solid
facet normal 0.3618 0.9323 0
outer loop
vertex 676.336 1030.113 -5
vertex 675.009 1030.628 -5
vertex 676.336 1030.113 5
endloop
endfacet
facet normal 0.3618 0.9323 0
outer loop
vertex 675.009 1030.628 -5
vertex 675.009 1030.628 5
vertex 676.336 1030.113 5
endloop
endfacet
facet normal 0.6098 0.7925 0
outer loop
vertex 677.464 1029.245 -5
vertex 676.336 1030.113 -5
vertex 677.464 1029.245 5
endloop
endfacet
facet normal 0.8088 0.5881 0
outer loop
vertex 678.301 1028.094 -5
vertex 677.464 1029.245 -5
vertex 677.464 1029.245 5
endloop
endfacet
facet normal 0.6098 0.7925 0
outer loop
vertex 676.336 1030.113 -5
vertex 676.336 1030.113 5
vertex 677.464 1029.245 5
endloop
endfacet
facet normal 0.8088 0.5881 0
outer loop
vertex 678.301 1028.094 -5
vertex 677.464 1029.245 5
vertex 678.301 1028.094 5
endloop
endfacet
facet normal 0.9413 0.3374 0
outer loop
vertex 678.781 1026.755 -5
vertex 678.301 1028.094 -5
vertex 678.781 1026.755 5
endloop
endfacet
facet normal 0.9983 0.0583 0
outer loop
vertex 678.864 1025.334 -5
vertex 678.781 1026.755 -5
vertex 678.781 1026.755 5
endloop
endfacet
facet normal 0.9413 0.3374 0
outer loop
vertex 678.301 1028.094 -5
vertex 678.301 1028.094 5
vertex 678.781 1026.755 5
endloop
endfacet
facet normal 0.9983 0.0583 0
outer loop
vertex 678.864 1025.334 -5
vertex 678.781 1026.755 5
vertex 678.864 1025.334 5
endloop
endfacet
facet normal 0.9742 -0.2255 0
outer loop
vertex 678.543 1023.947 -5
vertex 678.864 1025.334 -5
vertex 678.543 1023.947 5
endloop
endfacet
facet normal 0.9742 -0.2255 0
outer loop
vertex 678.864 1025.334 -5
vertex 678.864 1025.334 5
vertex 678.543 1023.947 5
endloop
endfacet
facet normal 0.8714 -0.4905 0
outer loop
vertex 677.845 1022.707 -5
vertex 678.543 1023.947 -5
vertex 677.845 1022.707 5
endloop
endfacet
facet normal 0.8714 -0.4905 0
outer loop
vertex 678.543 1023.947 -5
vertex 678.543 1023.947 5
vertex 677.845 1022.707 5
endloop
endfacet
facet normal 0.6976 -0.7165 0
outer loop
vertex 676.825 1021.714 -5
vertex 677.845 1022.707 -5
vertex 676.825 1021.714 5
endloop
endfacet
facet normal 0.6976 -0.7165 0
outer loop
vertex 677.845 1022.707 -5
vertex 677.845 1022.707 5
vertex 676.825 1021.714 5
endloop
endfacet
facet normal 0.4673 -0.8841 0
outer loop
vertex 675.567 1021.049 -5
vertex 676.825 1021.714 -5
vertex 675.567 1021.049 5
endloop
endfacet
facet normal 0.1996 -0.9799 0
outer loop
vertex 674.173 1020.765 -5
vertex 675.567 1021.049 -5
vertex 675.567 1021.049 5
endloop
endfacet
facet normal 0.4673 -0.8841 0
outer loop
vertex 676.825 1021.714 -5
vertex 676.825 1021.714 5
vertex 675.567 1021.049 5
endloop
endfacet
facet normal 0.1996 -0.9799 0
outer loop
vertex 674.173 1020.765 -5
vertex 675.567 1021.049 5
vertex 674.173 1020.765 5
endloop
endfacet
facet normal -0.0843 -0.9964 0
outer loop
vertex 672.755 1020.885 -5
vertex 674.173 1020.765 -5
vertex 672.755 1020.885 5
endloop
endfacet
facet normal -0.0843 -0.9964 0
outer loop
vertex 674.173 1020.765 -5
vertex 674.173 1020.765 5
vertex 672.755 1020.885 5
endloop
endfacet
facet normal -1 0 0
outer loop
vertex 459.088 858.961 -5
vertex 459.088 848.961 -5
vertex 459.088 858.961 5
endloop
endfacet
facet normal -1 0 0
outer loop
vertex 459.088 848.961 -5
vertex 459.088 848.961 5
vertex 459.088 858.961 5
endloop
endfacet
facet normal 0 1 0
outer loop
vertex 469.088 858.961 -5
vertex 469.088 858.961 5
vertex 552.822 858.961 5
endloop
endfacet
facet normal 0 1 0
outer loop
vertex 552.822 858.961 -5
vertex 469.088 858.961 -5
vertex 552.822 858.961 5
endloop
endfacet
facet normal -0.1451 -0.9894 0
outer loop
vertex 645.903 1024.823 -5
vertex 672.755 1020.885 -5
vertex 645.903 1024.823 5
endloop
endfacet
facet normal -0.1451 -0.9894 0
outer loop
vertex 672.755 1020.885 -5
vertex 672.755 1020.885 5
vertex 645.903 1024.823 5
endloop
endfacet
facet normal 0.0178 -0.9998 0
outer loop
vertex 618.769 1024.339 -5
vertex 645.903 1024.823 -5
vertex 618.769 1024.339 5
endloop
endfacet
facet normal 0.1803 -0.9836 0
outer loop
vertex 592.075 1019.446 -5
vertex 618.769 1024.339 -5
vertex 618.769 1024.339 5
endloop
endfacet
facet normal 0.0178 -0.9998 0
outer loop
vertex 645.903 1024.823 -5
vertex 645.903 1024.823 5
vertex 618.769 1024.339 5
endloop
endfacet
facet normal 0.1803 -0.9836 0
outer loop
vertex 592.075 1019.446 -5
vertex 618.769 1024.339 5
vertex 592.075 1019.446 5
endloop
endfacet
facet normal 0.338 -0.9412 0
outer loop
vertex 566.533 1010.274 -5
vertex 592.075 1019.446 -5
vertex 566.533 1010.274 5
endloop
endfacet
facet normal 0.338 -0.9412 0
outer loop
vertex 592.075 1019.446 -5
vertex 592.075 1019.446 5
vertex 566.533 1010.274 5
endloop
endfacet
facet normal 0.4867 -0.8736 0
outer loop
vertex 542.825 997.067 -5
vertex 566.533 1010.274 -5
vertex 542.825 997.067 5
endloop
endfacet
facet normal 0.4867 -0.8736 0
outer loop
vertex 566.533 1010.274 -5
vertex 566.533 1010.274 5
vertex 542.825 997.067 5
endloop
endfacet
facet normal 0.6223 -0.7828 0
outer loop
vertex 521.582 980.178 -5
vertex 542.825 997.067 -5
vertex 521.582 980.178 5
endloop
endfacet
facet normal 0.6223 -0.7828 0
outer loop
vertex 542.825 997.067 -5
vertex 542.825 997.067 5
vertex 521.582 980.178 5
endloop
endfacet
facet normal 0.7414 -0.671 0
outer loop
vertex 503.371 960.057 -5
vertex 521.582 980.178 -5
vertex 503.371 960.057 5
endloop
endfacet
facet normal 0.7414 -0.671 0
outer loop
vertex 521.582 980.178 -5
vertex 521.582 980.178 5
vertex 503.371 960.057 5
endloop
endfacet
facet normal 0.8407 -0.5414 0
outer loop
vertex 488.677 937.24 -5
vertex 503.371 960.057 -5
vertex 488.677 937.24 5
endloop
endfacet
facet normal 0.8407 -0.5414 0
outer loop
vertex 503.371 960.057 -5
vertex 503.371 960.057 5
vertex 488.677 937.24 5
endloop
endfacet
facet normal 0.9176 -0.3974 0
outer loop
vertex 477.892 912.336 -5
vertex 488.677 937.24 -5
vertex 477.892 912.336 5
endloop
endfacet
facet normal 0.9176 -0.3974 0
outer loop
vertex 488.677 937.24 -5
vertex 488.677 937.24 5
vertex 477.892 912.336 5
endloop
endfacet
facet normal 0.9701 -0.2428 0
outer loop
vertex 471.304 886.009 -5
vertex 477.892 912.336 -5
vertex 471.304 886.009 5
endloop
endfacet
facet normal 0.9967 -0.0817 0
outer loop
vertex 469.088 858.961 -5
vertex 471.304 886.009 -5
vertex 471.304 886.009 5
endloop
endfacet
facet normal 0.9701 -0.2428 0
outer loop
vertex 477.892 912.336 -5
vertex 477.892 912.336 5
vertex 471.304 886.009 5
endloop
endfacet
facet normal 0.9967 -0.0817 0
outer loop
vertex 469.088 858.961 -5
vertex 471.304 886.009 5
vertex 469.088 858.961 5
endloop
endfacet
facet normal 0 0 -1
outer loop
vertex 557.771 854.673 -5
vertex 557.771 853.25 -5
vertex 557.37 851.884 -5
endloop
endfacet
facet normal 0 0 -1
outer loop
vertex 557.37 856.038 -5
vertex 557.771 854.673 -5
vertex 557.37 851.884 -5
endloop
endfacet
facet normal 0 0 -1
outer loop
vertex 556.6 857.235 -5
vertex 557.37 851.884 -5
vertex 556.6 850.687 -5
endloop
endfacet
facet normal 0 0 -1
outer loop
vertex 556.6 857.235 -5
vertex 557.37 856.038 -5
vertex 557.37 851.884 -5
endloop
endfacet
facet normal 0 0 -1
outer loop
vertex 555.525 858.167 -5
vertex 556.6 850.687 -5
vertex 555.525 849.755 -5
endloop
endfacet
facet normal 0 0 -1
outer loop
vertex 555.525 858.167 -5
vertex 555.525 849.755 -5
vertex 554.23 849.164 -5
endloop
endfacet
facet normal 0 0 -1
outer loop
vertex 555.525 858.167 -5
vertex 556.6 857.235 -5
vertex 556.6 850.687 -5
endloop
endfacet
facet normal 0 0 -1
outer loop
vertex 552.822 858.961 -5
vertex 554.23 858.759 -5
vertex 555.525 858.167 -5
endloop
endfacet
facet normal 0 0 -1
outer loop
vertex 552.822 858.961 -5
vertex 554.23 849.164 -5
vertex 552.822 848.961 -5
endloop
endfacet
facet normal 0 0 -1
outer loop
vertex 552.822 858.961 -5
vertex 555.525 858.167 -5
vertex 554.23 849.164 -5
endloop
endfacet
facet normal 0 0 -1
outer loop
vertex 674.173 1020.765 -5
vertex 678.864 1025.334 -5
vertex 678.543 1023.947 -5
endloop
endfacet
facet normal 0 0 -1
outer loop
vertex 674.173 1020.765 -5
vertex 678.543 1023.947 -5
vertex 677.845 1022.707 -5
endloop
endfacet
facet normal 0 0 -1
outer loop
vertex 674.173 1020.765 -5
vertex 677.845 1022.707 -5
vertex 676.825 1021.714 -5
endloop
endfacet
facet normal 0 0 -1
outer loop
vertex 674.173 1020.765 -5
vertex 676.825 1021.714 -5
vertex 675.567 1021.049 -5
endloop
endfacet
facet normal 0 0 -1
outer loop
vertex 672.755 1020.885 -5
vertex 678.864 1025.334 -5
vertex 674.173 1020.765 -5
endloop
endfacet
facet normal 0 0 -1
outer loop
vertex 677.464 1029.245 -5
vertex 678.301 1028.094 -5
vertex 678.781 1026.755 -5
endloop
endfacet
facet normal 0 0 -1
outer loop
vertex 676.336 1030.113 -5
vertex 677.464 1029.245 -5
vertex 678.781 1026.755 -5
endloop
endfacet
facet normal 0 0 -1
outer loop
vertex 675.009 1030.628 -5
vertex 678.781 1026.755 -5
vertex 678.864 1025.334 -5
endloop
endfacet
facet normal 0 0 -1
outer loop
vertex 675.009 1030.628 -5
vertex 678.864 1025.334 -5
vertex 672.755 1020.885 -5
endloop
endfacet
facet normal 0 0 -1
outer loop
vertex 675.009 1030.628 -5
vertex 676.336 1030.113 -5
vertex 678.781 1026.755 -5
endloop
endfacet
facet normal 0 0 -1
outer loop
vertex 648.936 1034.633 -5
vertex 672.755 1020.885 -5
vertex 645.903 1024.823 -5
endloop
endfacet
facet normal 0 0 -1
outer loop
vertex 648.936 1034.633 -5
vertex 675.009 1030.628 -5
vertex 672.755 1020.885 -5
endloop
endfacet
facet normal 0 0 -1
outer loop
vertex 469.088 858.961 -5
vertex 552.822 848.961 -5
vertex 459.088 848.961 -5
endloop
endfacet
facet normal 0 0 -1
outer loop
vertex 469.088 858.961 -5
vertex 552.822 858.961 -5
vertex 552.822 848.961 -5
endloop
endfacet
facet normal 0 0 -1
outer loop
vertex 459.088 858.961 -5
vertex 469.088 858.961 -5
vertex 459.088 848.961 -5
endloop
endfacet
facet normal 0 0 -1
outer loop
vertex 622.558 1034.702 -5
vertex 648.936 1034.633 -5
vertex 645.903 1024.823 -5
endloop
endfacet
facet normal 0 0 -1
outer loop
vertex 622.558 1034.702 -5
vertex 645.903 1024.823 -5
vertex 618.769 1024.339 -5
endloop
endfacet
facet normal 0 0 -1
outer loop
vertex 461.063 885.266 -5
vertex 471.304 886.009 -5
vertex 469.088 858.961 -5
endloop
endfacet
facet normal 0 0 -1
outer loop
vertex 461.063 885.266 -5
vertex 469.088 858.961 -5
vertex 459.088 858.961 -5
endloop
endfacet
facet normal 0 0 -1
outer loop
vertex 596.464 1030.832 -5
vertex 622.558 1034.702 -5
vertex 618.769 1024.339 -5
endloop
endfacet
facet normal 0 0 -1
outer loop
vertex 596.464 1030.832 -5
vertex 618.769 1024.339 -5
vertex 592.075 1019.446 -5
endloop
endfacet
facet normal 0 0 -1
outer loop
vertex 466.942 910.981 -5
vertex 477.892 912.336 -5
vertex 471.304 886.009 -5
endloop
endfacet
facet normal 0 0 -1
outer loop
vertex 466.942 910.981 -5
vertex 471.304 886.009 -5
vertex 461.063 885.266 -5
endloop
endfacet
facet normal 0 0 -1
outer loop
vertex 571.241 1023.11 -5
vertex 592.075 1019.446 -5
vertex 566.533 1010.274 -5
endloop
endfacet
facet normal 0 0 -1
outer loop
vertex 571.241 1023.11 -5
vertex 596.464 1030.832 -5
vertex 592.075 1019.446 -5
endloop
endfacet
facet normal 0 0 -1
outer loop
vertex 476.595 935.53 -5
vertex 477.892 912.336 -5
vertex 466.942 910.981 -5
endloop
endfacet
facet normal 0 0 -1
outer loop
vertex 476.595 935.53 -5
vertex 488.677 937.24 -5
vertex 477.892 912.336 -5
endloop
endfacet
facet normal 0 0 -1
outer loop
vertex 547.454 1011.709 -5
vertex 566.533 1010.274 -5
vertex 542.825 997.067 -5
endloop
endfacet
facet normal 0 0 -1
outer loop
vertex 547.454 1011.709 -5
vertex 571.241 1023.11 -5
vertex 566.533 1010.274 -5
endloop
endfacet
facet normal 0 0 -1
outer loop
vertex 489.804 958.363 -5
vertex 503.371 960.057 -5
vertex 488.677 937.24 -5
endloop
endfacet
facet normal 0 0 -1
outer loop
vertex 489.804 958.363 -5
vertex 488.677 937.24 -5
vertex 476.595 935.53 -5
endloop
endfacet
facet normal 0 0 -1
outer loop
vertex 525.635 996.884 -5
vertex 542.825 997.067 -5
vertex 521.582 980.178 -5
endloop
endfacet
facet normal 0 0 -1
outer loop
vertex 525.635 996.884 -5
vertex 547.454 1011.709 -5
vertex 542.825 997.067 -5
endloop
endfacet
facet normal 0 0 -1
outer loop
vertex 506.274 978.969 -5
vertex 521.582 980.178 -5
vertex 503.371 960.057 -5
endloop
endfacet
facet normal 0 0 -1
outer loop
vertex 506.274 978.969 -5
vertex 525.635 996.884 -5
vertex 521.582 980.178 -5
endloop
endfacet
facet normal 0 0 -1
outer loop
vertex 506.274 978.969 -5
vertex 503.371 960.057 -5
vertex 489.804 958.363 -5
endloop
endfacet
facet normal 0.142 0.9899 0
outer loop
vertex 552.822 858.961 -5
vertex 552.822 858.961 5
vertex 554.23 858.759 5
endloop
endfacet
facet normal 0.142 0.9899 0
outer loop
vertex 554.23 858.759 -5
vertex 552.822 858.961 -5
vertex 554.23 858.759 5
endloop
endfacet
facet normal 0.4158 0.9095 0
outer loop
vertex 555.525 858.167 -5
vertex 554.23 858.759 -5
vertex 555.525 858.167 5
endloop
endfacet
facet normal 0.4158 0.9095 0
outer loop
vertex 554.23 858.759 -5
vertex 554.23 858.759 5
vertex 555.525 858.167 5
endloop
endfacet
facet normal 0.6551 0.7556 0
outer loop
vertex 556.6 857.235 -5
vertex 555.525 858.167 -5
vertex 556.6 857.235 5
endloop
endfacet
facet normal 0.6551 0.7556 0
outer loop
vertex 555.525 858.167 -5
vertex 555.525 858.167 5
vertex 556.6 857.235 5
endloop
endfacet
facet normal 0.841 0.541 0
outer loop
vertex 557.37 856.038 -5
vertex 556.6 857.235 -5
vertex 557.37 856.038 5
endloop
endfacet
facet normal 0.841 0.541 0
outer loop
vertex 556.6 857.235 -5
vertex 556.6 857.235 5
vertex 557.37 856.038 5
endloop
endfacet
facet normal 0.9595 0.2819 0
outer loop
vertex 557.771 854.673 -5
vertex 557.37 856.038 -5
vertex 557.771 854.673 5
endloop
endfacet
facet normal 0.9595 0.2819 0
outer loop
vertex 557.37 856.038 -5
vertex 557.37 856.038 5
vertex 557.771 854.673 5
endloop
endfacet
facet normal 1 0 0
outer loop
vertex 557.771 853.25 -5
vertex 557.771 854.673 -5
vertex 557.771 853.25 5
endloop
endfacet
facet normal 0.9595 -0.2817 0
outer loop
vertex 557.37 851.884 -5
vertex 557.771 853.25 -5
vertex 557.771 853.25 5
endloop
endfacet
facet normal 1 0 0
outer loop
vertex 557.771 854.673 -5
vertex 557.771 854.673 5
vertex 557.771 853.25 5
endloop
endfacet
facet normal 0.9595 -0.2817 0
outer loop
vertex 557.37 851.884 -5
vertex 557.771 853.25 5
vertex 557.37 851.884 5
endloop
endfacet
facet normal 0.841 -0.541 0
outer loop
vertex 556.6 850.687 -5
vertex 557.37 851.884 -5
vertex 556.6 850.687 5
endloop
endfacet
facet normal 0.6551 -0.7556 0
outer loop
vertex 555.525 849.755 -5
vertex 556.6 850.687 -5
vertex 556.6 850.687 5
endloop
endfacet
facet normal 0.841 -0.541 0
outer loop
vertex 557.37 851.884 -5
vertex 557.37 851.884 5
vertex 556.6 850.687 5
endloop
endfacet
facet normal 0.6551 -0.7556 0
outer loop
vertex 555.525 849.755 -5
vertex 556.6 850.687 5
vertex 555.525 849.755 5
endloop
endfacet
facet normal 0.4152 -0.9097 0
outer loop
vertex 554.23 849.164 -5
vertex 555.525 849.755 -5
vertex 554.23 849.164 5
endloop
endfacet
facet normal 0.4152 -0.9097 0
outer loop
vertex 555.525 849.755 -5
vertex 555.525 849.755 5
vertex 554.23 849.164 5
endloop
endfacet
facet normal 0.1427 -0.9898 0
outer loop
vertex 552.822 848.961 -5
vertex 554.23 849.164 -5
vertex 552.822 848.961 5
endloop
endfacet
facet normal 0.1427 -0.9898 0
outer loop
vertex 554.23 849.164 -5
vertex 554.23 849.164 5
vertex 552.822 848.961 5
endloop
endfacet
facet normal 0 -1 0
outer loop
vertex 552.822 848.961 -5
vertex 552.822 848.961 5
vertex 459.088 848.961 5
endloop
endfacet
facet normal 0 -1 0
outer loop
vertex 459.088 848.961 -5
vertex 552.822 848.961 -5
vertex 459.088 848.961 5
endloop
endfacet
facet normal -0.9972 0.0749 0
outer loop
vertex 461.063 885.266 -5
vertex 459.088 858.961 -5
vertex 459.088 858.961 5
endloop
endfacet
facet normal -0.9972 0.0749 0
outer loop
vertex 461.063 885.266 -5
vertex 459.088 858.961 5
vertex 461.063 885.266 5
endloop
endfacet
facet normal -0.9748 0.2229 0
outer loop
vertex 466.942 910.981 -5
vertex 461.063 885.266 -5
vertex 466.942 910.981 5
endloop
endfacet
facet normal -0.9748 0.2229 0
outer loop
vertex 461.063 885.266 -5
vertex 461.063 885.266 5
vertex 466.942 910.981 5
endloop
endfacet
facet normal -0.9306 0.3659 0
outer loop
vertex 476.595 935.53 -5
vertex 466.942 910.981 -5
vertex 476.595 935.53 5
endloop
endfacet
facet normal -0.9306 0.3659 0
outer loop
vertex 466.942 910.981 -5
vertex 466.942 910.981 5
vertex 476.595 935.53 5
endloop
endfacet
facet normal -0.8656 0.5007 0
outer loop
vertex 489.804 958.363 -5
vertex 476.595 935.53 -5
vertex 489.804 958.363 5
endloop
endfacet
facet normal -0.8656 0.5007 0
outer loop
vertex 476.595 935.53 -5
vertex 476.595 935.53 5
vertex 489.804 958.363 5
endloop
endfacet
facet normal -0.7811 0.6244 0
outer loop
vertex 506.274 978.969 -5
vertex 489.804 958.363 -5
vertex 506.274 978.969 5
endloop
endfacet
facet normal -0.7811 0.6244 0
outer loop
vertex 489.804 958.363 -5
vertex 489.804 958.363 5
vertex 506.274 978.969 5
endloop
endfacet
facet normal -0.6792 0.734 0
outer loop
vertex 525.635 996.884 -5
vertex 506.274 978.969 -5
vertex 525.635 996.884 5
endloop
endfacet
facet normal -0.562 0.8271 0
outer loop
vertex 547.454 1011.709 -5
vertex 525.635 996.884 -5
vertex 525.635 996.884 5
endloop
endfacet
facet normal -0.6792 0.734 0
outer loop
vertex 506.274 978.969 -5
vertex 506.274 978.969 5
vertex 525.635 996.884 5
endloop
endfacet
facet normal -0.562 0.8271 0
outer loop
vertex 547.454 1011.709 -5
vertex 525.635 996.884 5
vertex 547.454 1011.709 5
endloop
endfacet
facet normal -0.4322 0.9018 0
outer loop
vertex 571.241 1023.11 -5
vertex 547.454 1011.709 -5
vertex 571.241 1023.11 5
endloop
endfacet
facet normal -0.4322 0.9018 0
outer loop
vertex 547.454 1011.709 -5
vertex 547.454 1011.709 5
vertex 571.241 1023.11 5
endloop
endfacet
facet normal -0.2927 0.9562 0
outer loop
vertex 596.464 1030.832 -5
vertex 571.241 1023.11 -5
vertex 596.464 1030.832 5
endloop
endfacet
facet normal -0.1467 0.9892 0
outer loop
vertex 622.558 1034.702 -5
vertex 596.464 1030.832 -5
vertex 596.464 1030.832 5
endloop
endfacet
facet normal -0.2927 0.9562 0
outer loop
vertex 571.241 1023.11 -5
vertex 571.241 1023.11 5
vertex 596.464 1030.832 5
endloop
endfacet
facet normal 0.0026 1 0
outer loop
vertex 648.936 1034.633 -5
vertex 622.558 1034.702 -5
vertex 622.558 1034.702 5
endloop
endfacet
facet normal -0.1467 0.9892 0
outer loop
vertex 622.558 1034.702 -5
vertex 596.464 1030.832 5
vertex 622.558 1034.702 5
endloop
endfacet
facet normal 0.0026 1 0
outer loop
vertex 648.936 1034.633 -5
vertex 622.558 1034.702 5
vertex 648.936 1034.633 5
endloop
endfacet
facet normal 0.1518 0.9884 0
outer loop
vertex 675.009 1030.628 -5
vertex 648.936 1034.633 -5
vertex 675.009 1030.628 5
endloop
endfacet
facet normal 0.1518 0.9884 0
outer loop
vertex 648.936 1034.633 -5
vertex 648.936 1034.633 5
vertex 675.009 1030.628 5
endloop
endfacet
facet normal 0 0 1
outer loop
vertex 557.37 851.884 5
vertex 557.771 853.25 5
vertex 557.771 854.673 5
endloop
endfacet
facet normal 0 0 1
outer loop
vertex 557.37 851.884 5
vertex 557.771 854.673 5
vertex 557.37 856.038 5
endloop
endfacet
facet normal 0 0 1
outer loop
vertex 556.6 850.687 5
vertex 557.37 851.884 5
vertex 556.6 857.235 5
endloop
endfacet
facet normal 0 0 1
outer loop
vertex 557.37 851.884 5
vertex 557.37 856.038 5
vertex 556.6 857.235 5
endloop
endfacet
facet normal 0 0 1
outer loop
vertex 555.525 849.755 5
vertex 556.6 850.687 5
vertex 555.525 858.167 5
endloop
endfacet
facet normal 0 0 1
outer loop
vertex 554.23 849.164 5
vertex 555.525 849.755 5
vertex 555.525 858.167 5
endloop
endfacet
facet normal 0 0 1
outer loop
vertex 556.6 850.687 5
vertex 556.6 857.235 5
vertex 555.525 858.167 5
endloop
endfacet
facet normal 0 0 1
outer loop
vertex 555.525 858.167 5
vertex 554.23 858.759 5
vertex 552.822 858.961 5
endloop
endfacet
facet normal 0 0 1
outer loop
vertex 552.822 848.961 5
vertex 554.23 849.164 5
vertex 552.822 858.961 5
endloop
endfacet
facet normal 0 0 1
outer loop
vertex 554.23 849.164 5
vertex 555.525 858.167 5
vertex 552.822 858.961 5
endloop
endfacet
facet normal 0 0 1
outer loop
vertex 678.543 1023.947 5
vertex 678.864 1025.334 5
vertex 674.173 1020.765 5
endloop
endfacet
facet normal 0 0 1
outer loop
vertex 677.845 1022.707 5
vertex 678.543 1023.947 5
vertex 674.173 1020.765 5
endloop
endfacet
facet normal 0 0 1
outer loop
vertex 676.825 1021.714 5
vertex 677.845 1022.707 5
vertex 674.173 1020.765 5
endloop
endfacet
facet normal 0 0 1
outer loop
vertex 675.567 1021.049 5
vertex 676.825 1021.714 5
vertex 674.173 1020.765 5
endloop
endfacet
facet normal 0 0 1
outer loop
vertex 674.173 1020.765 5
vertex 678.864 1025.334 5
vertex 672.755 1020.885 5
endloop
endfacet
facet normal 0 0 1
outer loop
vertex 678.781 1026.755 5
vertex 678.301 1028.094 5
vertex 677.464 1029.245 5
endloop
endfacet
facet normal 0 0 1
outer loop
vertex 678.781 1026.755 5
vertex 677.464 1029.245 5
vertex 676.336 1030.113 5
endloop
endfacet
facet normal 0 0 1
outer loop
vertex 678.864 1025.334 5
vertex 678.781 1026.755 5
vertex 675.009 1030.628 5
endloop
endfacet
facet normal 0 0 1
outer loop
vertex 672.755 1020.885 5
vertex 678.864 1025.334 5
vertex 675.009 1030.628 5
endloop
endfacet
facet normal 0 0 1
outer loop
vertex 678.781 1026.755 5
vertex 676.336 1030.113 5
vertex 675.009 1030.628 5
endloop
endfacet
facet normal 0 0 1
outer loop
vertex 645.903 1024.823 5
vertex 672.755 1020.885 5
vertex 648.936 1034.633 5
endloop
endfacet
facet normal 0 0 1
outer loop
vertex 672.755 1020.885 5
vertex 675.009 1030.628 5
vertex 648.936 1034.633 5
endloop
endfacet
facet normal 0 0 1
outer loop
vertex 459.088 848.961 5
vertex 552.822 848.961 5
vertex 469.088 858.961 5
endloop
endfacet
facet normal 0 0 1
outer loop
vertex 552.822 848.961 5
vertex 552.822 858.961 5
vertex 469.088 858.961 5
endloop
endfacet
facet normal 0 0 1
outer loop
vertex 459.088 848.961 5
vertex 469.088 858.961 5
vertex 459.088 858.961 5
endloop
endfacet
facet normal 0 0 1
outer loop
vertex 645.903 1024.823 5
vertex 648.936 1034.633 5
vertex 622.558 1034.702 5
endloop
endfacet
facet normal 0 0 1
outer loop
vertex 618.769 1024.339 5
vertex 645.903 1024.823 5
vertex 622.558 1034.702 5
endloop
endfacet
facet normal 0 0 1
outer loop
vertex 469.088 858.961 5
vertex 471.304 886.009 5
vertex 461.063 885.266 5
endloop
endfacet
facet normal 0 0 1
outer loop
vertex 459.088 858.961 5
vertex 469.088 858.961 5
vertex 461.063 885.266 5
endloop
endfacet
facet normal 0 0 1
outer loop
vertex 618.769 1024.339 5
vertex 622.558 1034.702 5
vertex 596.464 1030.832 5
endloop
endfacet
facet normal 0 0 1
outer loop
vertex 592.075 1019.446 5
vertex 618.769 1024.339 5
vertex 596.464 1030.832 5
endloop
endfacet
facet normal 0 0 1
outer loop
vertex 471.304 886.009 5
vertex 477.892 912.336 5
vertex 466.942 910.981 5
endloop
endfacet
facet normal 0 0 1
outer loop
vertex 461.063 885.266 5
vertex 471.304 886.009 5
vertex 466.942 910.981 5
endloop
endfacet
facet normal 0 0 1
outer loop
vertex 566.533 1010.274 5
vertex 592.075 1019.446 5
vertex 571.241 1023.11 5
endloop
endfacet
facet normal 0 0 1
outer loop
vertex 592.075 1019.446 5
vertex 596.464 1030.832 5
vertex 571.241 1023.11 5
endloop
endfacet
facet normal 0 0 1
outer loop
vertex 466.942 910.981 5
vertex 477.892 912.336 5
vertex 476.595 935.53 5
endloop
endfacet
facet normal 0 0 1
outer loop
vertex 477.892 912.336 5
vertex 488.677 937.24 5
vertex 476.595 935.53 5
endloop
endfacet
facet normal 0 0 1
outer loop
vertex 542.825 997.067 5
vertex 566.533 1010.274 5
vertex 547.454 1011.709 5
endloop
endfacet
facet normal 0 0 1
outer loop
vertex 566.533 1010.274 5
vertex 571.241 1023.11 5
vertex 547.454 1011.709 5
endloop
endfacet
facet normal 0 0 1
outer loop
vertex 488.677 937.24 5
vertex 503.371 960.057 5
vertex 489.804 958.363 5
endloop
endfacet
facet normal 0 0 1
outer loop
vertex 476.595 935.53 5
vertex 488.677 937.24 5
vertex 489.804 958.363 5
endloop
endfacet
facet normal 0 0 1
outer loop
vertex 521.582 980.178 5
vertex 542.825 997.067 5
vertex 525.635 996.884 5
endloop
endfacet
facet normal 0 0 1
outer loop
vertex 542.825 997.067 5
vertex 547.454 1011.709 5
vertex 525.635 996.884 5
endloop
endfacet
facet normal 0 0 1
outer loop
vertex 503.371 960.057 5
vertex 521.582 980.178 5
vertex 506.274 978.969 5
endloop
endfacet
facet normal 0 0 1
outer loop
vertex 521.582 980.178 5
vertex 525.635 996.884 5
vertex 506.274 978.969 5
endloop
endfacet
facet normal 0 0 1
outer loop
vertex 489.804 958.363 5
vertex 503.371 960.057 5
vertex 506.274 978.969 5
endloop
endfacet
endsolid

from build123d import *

# Parameters (mm, degrees)
BOSS_EXTRUDE1_DEPTH = 5


with BuildPart() as part:
    # Sketch1 → Boss-Extrude1 (new, symmetric)
    with BuildSketch(Plane.XY):
        with BuildLine():
            Line((552.821544179, 848.961112624), (459.088326812, 848.961112624))
            Line((459.088326812, 848.961112624), (459.088326812, 858.961112624))
            ThreePointArc((459.088326812, 858.961112624), (525.634918269, 996.884166681), (675.00895728, 1030.627523725))
            ThreePointArc((675.00895728, 1030.627523725), (678.753172827, 1024.629119776), (672.754768877, 1020.884904229))
            ThreePointArc((672.754768877, 1020.884904229), (531.858185738, 989.056590938), (469.088326812, 858.961112624))
            Line((469.088326812, 858.961112624), (552.821544179, 858.961112624))
            ThreePointArc((552.821544179, 858.961112624), (557.821544179, 853.961112624), (552.821544179, 848.961112624))
        make_face()
    extrude(amount=BOSS_EXTRUDE1_DEPTH, both=True)


solid = part.part
